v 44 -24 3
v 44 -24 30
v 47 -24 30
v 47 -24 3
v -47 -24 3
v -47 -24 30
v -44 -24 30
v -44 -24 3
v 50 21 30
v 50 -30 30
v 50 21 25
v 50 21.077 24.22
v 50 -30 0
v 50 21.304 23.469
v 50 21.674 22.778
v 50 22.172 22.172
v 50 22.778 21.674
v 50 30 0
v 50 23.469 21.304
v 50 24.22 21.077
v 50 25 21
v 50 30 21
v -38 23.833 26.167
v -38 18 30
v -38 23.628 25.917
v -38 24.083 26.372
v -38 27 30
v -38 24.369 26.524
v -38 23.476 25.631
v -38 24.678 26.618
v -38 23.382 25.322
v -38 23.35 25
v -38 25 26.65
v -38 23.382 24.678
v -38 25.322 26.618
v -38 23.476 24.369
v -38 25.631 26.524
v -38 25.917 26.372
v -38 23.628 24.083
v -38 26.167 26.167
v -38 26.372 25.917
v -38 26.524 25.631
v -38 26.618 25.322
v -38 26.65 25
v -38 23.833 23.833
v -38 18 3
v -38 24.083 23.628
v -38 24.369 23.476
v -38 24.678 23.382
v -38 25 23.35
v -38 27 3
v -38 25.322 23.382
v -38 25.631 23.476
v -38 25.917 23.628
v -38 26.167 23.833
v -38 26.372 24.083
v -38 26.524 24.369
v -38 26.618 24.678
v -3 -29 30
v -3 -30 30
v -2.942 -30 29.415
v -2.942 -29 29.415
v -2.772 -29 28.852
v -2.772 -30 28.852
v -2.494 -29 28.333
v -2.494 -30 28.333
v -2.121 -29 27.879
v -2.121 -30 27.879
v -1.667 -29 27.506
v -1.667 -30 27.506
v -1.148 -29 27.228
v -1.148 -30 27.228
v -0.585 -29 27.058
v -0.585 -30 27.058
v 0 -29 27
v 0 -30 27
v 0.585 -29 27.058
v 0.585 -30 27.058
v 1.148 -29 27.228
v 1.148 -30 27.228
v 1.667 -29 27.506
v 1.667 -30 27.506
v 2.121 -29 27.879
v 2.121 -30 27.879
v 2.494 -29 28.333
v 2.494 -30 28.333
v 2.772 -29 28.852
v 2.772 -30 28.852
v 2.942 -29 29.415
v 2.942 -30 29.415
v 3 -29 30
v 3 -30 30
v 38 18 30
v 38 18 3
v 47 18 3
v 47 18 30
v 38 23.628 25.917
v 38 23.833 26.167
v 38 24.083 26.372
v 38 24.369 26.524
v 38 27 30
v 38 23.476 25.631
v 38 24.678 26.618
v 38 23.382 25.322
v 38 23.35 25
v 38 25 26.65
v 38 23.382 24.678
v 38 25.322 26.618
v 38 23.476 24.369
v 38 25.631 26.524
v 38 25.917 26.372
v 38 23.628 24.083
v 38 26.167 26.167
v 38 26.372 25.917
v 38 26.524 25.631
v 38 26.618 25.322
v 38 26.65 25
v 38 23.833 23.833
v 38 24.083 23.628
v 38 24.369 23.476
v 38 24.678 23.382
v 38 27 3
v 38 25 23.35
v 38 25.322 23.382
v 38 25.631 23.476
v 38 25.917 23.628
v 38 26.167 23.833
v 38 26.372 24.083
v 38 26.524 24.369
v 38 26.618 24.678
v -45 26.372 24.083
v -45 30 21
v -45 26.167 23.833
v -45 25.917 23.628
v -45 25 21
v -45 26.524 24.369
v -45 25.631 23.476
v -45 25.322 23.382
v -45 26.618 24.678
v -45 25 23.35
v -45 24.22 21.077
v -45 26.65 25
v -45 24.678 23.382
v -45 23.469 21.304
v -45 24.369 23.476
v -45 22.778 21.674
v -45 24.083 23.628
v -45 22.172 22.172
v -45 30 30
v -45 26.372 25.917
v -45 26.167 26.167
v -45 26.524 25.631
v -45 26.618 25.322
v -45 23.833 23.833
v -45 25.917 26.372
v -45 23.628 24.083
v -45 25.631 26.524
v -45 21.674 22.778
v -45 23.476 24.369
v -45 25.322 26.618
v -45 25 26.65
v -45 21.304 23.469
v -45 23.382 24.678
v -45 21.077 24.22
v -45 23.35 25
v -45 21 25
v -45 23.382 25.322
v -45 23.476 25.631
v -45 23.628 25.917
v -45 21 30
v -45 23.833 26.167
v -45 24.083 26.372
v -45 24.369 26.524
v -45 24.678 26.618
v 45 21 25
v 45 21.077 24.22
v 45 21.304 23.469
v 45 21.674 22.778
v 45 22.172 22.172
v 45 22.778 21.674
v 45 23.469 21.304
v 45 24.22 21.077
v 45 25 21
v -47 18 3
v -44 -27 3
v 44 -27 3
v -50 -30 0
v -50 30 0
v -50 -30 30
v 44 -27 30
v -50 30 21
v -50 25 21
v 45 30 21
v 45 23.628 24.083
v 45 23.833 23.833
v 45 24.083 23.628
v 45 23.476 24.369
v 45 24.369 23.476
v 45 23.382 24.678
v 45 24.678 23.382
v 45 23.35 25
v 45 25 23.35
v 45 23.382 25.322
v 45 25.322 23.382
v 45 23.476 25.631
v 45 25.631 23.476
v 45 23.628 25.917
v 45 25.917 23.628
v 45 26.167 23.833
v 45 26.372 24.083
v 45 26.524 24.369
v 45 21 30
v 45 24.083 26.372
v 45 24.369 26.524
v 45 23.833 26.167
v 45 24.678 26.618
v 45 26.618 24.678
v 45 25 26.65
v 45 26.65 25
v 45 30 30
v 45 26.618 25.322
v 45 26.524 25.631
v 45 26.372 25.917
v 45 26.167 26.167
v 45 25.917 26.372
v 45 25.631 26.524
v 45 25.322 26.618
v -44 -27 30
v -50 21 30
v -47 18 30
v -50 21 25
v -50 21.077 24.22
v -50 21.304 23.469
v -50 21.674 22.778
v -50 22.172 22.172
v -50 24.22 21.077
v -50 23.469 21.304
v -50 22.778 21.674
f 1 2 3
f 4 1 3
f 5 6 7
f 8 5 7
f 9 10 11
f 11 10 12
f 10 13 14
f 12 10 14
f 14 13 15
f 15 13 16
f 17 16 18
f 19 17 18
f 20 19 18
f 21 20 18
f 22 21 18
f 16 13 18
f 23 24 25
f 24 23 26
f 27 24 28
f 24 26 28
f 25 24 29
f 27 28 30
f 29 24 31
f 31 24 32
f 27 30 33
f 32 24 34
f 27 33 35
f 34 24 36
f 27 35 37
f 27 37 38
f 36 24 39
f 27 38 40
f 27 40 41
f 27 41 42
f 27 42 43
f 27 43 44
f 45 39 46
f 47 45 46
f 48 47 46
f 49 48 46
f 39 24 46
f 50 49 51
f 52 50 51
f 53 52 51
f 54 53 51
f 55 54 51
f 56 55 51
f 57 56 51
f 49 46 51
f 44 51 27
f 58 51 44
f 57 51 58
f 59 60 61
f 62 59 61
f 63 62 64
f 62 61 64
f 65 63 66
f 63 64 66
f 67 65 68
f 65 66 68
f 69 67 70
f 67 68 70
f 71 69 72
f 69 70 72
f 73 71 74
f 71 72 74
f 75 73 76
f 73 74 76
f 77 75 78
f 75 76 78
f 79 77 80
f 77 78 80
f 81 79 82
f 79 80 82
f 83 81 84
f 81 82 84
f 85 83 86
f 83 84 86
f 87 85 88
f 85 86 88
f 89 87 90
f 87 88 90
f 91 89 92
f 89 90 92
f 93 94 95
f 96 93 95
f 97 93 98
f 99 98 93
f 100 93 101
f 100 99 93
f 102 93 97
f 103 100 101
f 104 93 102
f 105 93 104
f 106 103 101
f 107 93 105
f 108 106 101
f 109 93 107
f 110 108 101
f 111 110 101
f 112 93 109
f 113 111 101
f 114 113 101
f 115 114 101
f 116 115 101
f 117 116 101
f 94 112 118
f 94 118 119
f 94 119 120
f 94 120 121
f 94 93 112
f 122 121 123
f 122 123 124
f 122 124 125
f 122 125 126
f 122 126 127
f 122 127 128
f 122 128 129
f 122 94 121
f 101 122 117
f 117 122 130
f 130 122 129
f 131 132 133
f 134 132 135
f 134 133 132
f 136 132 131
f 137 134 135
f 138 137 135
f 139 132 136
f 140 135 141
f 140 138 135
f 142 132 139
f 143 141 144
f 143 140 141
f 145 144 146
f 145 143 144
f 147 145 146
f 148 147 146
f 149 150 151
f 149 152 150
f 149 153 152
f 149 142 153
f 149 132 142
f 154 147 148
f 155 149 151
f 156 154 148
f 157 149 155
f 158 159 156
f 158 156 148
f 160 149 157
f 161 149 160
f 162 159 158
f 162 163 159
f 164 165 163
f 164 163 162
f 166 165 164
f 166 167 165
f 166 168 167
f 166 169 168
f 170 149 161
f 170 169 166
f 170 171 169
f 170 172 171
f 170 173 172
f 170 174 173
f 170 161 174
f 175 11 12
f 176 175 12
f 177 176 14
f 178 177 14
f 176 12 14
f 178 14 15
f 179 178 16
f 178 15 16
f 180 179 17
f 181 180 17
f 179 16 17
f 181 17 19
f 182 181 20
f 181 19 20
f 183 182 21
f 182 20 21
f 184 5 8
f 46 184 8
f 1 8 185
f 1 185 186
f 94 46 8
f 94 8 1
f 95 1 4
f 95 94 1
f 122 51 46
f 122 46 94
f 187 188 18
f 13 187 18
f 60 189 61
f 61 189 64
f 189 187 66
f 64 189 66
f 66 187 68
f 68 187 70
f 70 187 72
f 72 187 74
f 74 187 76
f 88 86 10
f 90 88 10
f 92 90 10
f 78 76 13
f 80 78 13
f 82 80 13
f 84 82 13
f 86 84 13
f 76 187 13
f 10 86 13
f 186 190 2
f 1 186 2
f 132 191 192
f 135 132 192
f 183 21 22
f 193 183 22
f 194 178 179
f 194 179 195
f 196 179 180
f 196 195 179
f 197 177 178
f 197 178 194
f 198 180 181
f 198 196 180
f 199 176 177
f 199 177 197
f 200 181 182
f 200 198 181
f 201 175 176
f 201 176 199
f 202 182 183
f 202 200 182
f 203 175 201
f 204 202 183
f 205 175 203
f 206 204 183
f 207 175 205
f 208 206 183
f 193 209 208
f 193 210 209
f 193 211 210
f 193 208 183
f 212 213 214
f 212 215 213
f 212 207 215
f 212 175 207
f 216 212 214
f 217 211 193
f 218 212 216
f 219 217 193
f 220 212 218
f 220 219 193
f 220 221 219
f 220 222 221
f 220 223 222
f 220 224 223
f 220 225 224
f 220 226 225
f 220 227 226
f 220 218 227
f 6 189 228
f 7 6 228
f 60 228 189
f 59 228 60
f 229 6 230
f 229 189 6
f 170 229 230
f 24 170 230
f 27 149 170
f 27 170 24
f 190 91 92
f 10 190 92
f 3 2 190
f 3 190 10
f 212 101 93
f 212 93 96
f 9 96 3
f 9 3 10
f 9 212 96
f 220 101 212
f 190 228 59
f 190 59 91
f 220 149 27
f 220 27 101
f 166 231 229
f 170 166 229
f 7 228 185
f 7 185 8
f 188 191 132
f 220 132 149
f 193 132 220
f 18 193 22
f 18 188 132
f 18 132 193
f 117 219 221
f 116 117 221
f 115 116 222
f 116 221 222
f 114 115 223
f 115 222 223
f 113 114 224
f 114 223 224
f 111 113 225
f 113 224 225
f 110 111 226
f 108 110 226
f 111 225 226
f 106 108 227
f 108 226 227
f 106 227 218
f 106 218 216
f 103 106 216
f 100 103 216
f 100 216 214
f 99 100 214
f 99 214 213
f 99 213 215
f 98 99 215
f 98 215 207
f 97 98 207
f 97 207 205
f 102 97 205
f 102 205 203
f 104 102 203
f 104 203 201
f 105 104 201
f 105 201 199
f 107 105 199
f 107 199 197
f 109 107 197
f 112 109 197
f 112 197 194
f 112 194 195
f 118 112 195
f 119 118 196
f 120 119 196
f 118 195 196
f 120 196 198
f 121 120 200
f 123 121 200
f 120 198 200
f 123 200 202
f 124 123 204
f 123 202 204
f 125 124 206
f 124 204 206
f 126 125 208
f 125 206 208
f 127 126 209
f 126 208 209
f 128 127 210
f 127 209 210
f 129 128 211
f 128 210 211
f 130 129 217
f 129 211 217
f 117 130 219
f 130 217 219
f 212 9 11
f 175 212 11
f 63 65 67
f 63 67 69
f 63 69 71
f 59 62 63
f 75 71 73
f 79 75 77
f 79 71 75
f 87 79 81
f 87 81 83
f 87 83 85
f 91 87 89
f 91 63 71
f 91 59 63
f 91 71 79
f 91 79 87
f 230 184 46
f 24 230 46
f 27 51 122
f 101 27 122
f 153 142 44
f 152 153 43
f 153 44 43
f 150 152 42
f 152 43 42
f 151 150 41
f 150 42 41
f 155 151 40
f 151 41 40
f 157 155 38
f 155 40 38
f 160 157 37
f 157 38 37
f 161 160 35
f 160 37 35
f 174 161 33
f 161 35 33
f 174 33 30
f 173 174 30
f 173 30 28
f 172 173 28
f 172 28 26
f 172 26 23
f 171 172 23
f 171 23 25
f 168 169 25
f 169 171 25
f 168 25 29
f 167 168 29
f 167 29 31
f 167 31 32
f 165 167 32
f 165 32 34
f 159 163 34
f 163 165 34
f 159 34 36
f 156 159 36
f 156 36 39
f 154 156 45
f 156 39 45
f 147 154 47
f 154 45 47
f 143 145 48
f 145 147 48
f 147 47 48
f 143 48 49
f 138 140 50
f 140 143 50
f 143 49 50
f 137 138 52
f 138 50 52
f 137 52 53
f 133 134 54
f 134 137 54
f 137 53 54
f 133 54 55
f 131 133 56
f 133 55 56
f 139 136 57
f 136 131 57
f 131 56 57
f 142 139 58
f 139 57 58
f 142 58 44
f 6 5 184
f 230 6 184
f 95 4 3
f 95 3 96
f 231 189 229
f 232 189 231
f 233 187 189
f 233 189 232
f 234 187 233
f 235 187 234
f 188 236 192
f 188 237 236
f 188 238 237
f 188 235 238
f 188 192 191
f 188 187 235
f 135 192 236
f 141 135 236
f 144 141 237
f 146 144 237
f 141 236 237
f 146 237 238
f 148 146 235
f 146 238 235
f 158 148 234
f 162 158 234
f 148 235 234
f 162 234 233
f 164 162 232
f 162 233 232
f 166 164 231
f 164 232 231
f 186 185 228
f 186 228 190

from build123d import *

# Parameters (mm, degrees)
F0_W      = 100
F0_H      = 60
F1_DEPTH  = 30
F2_T      = -3
F3_W      = 9
F3_H      = 9
F3_W_2    = 3
F3_H_2    = 3
F4_DEPTH  = 27
F5_R      = 1.65
F6_DEPTH  = 100.001
F7_R      = 1.65
F8_DEPTH  = 5
F9_R      = 1.65
F10_DEPTH = 5
F12_DEPTH = 1


with BuildPart() as f1:
    # F0 (on Top) → F1 (new body)
    with BuildSketch(Plane.XY):
        Rectangle(F0_W, F0_H)
    extrude(amount=F1_DEPTH)

    # F2
    f2_openings = [f1.faces().sort_by_distance(p)[0] for p in [
        (0, 0, 30),
    ]]
    offset(amount=F2_T, openings=f2_openings)

    # F3 (on face) → F4 (join)
    with BuildSketch(Plane.XY.offset(3)):
        with Locations((-42.5, 22.5)):
            Rectangle(F3_W, F3_H)
        with Locations((42.5, 22.5)):
            Rectangle(F3_W, F3_H)
        with Locations((45.5, -25.5)):
            Rectangle(F3_W_2, F3_H_2)
        with Locations((-45.5, -25.5)):
            Rectangle(F3_W_2, F3_H_2)
    extrude(amount=F4_DEPTH)

    # F5 (on face) → F6 (cut, through all)
    with BuildSketch(Plane.YZ.offset(50)):
        with Locations((25, 25)):
            Circle(F5_R)
    extrude(amount=-F6_DEPTH, mode=Mode.SUBTRACT)

    # F7 (on face) → F8 (cut)
    with BuildSketch(Plane.YZ.offset(50)):
        with BuildLine():
            ThreePointArc((25, 21), (27.8284271247, 22.1715728753), (29, 25))
            ThreePointArc((29, 25), (25, 29), (21, 25))
            ThreePointArc((21, 25), (22.1715728753, 22.1715728753), (25, 21))
        make_face()
        with Locations((25, 25)):
            Circle(F7_R, mode=Mode.SUBTRACT)
        with BuildLine():
            ThreePointArc((21, 25), (25, 29), (29, 25))
            ThreePointArc((29, 25), (27.8284271247, 22.1715728753), (25, 21))
            Line((25, 21), (30, 21))
            Line((30, 21), (30, 30))
            Line((30, 30), (21, 30))
            Line((21, 30), (21, 25))
        make_face()
    extrude(amount=-F8_DEPTH, mode=Mode.SUBTRACT)

    # F9 (on face) → F10 (cut)
    with BuildSketch(Plane(origin=(-50, 0, 0), x_dir=(0, -1, 0), z_dir=(-1, 0, 0))):
        with BuildLine():
            ThreePointArc((-25, 21), (-22.1715728753, 22.1715728753), (-21, 25))
            ThreePointArc((-21, 25), (-27.8284271247, 27.8284271247), (-25, 21))
        make_face()
        with Locations((-25, 25)):
            Circle(F9_R, mode=Mode.SUBTRACT)
        with BuildLine():
            ThreePointArc((-25, 21), (-27.8284271247, 27.8284271247), (-21, 25))
            Line((-21, 25), (-21, 30))
            Line((-21, 30), (-30, 30))
            Line((-30, 30), (-30, 21))
            Line((-30, 21), (-25, 21))
        make_face()
    extrude(amount=-F10_DEPTH, mode=Mode.SUBTRACT)

    # F11 (on face) → F12 (cut)
    with BuildSketch(Plane.XZ.offset(30)):
        with BuildLine():
            ThreePointArc((-3, 30), (0, 27), (3, 30))
            Line((3, 30), (-3, 30))
        make_face()
    extrude(amount=-F12_DEPTH, mode=Mode.SUBTRACT)


solid = f1.part
